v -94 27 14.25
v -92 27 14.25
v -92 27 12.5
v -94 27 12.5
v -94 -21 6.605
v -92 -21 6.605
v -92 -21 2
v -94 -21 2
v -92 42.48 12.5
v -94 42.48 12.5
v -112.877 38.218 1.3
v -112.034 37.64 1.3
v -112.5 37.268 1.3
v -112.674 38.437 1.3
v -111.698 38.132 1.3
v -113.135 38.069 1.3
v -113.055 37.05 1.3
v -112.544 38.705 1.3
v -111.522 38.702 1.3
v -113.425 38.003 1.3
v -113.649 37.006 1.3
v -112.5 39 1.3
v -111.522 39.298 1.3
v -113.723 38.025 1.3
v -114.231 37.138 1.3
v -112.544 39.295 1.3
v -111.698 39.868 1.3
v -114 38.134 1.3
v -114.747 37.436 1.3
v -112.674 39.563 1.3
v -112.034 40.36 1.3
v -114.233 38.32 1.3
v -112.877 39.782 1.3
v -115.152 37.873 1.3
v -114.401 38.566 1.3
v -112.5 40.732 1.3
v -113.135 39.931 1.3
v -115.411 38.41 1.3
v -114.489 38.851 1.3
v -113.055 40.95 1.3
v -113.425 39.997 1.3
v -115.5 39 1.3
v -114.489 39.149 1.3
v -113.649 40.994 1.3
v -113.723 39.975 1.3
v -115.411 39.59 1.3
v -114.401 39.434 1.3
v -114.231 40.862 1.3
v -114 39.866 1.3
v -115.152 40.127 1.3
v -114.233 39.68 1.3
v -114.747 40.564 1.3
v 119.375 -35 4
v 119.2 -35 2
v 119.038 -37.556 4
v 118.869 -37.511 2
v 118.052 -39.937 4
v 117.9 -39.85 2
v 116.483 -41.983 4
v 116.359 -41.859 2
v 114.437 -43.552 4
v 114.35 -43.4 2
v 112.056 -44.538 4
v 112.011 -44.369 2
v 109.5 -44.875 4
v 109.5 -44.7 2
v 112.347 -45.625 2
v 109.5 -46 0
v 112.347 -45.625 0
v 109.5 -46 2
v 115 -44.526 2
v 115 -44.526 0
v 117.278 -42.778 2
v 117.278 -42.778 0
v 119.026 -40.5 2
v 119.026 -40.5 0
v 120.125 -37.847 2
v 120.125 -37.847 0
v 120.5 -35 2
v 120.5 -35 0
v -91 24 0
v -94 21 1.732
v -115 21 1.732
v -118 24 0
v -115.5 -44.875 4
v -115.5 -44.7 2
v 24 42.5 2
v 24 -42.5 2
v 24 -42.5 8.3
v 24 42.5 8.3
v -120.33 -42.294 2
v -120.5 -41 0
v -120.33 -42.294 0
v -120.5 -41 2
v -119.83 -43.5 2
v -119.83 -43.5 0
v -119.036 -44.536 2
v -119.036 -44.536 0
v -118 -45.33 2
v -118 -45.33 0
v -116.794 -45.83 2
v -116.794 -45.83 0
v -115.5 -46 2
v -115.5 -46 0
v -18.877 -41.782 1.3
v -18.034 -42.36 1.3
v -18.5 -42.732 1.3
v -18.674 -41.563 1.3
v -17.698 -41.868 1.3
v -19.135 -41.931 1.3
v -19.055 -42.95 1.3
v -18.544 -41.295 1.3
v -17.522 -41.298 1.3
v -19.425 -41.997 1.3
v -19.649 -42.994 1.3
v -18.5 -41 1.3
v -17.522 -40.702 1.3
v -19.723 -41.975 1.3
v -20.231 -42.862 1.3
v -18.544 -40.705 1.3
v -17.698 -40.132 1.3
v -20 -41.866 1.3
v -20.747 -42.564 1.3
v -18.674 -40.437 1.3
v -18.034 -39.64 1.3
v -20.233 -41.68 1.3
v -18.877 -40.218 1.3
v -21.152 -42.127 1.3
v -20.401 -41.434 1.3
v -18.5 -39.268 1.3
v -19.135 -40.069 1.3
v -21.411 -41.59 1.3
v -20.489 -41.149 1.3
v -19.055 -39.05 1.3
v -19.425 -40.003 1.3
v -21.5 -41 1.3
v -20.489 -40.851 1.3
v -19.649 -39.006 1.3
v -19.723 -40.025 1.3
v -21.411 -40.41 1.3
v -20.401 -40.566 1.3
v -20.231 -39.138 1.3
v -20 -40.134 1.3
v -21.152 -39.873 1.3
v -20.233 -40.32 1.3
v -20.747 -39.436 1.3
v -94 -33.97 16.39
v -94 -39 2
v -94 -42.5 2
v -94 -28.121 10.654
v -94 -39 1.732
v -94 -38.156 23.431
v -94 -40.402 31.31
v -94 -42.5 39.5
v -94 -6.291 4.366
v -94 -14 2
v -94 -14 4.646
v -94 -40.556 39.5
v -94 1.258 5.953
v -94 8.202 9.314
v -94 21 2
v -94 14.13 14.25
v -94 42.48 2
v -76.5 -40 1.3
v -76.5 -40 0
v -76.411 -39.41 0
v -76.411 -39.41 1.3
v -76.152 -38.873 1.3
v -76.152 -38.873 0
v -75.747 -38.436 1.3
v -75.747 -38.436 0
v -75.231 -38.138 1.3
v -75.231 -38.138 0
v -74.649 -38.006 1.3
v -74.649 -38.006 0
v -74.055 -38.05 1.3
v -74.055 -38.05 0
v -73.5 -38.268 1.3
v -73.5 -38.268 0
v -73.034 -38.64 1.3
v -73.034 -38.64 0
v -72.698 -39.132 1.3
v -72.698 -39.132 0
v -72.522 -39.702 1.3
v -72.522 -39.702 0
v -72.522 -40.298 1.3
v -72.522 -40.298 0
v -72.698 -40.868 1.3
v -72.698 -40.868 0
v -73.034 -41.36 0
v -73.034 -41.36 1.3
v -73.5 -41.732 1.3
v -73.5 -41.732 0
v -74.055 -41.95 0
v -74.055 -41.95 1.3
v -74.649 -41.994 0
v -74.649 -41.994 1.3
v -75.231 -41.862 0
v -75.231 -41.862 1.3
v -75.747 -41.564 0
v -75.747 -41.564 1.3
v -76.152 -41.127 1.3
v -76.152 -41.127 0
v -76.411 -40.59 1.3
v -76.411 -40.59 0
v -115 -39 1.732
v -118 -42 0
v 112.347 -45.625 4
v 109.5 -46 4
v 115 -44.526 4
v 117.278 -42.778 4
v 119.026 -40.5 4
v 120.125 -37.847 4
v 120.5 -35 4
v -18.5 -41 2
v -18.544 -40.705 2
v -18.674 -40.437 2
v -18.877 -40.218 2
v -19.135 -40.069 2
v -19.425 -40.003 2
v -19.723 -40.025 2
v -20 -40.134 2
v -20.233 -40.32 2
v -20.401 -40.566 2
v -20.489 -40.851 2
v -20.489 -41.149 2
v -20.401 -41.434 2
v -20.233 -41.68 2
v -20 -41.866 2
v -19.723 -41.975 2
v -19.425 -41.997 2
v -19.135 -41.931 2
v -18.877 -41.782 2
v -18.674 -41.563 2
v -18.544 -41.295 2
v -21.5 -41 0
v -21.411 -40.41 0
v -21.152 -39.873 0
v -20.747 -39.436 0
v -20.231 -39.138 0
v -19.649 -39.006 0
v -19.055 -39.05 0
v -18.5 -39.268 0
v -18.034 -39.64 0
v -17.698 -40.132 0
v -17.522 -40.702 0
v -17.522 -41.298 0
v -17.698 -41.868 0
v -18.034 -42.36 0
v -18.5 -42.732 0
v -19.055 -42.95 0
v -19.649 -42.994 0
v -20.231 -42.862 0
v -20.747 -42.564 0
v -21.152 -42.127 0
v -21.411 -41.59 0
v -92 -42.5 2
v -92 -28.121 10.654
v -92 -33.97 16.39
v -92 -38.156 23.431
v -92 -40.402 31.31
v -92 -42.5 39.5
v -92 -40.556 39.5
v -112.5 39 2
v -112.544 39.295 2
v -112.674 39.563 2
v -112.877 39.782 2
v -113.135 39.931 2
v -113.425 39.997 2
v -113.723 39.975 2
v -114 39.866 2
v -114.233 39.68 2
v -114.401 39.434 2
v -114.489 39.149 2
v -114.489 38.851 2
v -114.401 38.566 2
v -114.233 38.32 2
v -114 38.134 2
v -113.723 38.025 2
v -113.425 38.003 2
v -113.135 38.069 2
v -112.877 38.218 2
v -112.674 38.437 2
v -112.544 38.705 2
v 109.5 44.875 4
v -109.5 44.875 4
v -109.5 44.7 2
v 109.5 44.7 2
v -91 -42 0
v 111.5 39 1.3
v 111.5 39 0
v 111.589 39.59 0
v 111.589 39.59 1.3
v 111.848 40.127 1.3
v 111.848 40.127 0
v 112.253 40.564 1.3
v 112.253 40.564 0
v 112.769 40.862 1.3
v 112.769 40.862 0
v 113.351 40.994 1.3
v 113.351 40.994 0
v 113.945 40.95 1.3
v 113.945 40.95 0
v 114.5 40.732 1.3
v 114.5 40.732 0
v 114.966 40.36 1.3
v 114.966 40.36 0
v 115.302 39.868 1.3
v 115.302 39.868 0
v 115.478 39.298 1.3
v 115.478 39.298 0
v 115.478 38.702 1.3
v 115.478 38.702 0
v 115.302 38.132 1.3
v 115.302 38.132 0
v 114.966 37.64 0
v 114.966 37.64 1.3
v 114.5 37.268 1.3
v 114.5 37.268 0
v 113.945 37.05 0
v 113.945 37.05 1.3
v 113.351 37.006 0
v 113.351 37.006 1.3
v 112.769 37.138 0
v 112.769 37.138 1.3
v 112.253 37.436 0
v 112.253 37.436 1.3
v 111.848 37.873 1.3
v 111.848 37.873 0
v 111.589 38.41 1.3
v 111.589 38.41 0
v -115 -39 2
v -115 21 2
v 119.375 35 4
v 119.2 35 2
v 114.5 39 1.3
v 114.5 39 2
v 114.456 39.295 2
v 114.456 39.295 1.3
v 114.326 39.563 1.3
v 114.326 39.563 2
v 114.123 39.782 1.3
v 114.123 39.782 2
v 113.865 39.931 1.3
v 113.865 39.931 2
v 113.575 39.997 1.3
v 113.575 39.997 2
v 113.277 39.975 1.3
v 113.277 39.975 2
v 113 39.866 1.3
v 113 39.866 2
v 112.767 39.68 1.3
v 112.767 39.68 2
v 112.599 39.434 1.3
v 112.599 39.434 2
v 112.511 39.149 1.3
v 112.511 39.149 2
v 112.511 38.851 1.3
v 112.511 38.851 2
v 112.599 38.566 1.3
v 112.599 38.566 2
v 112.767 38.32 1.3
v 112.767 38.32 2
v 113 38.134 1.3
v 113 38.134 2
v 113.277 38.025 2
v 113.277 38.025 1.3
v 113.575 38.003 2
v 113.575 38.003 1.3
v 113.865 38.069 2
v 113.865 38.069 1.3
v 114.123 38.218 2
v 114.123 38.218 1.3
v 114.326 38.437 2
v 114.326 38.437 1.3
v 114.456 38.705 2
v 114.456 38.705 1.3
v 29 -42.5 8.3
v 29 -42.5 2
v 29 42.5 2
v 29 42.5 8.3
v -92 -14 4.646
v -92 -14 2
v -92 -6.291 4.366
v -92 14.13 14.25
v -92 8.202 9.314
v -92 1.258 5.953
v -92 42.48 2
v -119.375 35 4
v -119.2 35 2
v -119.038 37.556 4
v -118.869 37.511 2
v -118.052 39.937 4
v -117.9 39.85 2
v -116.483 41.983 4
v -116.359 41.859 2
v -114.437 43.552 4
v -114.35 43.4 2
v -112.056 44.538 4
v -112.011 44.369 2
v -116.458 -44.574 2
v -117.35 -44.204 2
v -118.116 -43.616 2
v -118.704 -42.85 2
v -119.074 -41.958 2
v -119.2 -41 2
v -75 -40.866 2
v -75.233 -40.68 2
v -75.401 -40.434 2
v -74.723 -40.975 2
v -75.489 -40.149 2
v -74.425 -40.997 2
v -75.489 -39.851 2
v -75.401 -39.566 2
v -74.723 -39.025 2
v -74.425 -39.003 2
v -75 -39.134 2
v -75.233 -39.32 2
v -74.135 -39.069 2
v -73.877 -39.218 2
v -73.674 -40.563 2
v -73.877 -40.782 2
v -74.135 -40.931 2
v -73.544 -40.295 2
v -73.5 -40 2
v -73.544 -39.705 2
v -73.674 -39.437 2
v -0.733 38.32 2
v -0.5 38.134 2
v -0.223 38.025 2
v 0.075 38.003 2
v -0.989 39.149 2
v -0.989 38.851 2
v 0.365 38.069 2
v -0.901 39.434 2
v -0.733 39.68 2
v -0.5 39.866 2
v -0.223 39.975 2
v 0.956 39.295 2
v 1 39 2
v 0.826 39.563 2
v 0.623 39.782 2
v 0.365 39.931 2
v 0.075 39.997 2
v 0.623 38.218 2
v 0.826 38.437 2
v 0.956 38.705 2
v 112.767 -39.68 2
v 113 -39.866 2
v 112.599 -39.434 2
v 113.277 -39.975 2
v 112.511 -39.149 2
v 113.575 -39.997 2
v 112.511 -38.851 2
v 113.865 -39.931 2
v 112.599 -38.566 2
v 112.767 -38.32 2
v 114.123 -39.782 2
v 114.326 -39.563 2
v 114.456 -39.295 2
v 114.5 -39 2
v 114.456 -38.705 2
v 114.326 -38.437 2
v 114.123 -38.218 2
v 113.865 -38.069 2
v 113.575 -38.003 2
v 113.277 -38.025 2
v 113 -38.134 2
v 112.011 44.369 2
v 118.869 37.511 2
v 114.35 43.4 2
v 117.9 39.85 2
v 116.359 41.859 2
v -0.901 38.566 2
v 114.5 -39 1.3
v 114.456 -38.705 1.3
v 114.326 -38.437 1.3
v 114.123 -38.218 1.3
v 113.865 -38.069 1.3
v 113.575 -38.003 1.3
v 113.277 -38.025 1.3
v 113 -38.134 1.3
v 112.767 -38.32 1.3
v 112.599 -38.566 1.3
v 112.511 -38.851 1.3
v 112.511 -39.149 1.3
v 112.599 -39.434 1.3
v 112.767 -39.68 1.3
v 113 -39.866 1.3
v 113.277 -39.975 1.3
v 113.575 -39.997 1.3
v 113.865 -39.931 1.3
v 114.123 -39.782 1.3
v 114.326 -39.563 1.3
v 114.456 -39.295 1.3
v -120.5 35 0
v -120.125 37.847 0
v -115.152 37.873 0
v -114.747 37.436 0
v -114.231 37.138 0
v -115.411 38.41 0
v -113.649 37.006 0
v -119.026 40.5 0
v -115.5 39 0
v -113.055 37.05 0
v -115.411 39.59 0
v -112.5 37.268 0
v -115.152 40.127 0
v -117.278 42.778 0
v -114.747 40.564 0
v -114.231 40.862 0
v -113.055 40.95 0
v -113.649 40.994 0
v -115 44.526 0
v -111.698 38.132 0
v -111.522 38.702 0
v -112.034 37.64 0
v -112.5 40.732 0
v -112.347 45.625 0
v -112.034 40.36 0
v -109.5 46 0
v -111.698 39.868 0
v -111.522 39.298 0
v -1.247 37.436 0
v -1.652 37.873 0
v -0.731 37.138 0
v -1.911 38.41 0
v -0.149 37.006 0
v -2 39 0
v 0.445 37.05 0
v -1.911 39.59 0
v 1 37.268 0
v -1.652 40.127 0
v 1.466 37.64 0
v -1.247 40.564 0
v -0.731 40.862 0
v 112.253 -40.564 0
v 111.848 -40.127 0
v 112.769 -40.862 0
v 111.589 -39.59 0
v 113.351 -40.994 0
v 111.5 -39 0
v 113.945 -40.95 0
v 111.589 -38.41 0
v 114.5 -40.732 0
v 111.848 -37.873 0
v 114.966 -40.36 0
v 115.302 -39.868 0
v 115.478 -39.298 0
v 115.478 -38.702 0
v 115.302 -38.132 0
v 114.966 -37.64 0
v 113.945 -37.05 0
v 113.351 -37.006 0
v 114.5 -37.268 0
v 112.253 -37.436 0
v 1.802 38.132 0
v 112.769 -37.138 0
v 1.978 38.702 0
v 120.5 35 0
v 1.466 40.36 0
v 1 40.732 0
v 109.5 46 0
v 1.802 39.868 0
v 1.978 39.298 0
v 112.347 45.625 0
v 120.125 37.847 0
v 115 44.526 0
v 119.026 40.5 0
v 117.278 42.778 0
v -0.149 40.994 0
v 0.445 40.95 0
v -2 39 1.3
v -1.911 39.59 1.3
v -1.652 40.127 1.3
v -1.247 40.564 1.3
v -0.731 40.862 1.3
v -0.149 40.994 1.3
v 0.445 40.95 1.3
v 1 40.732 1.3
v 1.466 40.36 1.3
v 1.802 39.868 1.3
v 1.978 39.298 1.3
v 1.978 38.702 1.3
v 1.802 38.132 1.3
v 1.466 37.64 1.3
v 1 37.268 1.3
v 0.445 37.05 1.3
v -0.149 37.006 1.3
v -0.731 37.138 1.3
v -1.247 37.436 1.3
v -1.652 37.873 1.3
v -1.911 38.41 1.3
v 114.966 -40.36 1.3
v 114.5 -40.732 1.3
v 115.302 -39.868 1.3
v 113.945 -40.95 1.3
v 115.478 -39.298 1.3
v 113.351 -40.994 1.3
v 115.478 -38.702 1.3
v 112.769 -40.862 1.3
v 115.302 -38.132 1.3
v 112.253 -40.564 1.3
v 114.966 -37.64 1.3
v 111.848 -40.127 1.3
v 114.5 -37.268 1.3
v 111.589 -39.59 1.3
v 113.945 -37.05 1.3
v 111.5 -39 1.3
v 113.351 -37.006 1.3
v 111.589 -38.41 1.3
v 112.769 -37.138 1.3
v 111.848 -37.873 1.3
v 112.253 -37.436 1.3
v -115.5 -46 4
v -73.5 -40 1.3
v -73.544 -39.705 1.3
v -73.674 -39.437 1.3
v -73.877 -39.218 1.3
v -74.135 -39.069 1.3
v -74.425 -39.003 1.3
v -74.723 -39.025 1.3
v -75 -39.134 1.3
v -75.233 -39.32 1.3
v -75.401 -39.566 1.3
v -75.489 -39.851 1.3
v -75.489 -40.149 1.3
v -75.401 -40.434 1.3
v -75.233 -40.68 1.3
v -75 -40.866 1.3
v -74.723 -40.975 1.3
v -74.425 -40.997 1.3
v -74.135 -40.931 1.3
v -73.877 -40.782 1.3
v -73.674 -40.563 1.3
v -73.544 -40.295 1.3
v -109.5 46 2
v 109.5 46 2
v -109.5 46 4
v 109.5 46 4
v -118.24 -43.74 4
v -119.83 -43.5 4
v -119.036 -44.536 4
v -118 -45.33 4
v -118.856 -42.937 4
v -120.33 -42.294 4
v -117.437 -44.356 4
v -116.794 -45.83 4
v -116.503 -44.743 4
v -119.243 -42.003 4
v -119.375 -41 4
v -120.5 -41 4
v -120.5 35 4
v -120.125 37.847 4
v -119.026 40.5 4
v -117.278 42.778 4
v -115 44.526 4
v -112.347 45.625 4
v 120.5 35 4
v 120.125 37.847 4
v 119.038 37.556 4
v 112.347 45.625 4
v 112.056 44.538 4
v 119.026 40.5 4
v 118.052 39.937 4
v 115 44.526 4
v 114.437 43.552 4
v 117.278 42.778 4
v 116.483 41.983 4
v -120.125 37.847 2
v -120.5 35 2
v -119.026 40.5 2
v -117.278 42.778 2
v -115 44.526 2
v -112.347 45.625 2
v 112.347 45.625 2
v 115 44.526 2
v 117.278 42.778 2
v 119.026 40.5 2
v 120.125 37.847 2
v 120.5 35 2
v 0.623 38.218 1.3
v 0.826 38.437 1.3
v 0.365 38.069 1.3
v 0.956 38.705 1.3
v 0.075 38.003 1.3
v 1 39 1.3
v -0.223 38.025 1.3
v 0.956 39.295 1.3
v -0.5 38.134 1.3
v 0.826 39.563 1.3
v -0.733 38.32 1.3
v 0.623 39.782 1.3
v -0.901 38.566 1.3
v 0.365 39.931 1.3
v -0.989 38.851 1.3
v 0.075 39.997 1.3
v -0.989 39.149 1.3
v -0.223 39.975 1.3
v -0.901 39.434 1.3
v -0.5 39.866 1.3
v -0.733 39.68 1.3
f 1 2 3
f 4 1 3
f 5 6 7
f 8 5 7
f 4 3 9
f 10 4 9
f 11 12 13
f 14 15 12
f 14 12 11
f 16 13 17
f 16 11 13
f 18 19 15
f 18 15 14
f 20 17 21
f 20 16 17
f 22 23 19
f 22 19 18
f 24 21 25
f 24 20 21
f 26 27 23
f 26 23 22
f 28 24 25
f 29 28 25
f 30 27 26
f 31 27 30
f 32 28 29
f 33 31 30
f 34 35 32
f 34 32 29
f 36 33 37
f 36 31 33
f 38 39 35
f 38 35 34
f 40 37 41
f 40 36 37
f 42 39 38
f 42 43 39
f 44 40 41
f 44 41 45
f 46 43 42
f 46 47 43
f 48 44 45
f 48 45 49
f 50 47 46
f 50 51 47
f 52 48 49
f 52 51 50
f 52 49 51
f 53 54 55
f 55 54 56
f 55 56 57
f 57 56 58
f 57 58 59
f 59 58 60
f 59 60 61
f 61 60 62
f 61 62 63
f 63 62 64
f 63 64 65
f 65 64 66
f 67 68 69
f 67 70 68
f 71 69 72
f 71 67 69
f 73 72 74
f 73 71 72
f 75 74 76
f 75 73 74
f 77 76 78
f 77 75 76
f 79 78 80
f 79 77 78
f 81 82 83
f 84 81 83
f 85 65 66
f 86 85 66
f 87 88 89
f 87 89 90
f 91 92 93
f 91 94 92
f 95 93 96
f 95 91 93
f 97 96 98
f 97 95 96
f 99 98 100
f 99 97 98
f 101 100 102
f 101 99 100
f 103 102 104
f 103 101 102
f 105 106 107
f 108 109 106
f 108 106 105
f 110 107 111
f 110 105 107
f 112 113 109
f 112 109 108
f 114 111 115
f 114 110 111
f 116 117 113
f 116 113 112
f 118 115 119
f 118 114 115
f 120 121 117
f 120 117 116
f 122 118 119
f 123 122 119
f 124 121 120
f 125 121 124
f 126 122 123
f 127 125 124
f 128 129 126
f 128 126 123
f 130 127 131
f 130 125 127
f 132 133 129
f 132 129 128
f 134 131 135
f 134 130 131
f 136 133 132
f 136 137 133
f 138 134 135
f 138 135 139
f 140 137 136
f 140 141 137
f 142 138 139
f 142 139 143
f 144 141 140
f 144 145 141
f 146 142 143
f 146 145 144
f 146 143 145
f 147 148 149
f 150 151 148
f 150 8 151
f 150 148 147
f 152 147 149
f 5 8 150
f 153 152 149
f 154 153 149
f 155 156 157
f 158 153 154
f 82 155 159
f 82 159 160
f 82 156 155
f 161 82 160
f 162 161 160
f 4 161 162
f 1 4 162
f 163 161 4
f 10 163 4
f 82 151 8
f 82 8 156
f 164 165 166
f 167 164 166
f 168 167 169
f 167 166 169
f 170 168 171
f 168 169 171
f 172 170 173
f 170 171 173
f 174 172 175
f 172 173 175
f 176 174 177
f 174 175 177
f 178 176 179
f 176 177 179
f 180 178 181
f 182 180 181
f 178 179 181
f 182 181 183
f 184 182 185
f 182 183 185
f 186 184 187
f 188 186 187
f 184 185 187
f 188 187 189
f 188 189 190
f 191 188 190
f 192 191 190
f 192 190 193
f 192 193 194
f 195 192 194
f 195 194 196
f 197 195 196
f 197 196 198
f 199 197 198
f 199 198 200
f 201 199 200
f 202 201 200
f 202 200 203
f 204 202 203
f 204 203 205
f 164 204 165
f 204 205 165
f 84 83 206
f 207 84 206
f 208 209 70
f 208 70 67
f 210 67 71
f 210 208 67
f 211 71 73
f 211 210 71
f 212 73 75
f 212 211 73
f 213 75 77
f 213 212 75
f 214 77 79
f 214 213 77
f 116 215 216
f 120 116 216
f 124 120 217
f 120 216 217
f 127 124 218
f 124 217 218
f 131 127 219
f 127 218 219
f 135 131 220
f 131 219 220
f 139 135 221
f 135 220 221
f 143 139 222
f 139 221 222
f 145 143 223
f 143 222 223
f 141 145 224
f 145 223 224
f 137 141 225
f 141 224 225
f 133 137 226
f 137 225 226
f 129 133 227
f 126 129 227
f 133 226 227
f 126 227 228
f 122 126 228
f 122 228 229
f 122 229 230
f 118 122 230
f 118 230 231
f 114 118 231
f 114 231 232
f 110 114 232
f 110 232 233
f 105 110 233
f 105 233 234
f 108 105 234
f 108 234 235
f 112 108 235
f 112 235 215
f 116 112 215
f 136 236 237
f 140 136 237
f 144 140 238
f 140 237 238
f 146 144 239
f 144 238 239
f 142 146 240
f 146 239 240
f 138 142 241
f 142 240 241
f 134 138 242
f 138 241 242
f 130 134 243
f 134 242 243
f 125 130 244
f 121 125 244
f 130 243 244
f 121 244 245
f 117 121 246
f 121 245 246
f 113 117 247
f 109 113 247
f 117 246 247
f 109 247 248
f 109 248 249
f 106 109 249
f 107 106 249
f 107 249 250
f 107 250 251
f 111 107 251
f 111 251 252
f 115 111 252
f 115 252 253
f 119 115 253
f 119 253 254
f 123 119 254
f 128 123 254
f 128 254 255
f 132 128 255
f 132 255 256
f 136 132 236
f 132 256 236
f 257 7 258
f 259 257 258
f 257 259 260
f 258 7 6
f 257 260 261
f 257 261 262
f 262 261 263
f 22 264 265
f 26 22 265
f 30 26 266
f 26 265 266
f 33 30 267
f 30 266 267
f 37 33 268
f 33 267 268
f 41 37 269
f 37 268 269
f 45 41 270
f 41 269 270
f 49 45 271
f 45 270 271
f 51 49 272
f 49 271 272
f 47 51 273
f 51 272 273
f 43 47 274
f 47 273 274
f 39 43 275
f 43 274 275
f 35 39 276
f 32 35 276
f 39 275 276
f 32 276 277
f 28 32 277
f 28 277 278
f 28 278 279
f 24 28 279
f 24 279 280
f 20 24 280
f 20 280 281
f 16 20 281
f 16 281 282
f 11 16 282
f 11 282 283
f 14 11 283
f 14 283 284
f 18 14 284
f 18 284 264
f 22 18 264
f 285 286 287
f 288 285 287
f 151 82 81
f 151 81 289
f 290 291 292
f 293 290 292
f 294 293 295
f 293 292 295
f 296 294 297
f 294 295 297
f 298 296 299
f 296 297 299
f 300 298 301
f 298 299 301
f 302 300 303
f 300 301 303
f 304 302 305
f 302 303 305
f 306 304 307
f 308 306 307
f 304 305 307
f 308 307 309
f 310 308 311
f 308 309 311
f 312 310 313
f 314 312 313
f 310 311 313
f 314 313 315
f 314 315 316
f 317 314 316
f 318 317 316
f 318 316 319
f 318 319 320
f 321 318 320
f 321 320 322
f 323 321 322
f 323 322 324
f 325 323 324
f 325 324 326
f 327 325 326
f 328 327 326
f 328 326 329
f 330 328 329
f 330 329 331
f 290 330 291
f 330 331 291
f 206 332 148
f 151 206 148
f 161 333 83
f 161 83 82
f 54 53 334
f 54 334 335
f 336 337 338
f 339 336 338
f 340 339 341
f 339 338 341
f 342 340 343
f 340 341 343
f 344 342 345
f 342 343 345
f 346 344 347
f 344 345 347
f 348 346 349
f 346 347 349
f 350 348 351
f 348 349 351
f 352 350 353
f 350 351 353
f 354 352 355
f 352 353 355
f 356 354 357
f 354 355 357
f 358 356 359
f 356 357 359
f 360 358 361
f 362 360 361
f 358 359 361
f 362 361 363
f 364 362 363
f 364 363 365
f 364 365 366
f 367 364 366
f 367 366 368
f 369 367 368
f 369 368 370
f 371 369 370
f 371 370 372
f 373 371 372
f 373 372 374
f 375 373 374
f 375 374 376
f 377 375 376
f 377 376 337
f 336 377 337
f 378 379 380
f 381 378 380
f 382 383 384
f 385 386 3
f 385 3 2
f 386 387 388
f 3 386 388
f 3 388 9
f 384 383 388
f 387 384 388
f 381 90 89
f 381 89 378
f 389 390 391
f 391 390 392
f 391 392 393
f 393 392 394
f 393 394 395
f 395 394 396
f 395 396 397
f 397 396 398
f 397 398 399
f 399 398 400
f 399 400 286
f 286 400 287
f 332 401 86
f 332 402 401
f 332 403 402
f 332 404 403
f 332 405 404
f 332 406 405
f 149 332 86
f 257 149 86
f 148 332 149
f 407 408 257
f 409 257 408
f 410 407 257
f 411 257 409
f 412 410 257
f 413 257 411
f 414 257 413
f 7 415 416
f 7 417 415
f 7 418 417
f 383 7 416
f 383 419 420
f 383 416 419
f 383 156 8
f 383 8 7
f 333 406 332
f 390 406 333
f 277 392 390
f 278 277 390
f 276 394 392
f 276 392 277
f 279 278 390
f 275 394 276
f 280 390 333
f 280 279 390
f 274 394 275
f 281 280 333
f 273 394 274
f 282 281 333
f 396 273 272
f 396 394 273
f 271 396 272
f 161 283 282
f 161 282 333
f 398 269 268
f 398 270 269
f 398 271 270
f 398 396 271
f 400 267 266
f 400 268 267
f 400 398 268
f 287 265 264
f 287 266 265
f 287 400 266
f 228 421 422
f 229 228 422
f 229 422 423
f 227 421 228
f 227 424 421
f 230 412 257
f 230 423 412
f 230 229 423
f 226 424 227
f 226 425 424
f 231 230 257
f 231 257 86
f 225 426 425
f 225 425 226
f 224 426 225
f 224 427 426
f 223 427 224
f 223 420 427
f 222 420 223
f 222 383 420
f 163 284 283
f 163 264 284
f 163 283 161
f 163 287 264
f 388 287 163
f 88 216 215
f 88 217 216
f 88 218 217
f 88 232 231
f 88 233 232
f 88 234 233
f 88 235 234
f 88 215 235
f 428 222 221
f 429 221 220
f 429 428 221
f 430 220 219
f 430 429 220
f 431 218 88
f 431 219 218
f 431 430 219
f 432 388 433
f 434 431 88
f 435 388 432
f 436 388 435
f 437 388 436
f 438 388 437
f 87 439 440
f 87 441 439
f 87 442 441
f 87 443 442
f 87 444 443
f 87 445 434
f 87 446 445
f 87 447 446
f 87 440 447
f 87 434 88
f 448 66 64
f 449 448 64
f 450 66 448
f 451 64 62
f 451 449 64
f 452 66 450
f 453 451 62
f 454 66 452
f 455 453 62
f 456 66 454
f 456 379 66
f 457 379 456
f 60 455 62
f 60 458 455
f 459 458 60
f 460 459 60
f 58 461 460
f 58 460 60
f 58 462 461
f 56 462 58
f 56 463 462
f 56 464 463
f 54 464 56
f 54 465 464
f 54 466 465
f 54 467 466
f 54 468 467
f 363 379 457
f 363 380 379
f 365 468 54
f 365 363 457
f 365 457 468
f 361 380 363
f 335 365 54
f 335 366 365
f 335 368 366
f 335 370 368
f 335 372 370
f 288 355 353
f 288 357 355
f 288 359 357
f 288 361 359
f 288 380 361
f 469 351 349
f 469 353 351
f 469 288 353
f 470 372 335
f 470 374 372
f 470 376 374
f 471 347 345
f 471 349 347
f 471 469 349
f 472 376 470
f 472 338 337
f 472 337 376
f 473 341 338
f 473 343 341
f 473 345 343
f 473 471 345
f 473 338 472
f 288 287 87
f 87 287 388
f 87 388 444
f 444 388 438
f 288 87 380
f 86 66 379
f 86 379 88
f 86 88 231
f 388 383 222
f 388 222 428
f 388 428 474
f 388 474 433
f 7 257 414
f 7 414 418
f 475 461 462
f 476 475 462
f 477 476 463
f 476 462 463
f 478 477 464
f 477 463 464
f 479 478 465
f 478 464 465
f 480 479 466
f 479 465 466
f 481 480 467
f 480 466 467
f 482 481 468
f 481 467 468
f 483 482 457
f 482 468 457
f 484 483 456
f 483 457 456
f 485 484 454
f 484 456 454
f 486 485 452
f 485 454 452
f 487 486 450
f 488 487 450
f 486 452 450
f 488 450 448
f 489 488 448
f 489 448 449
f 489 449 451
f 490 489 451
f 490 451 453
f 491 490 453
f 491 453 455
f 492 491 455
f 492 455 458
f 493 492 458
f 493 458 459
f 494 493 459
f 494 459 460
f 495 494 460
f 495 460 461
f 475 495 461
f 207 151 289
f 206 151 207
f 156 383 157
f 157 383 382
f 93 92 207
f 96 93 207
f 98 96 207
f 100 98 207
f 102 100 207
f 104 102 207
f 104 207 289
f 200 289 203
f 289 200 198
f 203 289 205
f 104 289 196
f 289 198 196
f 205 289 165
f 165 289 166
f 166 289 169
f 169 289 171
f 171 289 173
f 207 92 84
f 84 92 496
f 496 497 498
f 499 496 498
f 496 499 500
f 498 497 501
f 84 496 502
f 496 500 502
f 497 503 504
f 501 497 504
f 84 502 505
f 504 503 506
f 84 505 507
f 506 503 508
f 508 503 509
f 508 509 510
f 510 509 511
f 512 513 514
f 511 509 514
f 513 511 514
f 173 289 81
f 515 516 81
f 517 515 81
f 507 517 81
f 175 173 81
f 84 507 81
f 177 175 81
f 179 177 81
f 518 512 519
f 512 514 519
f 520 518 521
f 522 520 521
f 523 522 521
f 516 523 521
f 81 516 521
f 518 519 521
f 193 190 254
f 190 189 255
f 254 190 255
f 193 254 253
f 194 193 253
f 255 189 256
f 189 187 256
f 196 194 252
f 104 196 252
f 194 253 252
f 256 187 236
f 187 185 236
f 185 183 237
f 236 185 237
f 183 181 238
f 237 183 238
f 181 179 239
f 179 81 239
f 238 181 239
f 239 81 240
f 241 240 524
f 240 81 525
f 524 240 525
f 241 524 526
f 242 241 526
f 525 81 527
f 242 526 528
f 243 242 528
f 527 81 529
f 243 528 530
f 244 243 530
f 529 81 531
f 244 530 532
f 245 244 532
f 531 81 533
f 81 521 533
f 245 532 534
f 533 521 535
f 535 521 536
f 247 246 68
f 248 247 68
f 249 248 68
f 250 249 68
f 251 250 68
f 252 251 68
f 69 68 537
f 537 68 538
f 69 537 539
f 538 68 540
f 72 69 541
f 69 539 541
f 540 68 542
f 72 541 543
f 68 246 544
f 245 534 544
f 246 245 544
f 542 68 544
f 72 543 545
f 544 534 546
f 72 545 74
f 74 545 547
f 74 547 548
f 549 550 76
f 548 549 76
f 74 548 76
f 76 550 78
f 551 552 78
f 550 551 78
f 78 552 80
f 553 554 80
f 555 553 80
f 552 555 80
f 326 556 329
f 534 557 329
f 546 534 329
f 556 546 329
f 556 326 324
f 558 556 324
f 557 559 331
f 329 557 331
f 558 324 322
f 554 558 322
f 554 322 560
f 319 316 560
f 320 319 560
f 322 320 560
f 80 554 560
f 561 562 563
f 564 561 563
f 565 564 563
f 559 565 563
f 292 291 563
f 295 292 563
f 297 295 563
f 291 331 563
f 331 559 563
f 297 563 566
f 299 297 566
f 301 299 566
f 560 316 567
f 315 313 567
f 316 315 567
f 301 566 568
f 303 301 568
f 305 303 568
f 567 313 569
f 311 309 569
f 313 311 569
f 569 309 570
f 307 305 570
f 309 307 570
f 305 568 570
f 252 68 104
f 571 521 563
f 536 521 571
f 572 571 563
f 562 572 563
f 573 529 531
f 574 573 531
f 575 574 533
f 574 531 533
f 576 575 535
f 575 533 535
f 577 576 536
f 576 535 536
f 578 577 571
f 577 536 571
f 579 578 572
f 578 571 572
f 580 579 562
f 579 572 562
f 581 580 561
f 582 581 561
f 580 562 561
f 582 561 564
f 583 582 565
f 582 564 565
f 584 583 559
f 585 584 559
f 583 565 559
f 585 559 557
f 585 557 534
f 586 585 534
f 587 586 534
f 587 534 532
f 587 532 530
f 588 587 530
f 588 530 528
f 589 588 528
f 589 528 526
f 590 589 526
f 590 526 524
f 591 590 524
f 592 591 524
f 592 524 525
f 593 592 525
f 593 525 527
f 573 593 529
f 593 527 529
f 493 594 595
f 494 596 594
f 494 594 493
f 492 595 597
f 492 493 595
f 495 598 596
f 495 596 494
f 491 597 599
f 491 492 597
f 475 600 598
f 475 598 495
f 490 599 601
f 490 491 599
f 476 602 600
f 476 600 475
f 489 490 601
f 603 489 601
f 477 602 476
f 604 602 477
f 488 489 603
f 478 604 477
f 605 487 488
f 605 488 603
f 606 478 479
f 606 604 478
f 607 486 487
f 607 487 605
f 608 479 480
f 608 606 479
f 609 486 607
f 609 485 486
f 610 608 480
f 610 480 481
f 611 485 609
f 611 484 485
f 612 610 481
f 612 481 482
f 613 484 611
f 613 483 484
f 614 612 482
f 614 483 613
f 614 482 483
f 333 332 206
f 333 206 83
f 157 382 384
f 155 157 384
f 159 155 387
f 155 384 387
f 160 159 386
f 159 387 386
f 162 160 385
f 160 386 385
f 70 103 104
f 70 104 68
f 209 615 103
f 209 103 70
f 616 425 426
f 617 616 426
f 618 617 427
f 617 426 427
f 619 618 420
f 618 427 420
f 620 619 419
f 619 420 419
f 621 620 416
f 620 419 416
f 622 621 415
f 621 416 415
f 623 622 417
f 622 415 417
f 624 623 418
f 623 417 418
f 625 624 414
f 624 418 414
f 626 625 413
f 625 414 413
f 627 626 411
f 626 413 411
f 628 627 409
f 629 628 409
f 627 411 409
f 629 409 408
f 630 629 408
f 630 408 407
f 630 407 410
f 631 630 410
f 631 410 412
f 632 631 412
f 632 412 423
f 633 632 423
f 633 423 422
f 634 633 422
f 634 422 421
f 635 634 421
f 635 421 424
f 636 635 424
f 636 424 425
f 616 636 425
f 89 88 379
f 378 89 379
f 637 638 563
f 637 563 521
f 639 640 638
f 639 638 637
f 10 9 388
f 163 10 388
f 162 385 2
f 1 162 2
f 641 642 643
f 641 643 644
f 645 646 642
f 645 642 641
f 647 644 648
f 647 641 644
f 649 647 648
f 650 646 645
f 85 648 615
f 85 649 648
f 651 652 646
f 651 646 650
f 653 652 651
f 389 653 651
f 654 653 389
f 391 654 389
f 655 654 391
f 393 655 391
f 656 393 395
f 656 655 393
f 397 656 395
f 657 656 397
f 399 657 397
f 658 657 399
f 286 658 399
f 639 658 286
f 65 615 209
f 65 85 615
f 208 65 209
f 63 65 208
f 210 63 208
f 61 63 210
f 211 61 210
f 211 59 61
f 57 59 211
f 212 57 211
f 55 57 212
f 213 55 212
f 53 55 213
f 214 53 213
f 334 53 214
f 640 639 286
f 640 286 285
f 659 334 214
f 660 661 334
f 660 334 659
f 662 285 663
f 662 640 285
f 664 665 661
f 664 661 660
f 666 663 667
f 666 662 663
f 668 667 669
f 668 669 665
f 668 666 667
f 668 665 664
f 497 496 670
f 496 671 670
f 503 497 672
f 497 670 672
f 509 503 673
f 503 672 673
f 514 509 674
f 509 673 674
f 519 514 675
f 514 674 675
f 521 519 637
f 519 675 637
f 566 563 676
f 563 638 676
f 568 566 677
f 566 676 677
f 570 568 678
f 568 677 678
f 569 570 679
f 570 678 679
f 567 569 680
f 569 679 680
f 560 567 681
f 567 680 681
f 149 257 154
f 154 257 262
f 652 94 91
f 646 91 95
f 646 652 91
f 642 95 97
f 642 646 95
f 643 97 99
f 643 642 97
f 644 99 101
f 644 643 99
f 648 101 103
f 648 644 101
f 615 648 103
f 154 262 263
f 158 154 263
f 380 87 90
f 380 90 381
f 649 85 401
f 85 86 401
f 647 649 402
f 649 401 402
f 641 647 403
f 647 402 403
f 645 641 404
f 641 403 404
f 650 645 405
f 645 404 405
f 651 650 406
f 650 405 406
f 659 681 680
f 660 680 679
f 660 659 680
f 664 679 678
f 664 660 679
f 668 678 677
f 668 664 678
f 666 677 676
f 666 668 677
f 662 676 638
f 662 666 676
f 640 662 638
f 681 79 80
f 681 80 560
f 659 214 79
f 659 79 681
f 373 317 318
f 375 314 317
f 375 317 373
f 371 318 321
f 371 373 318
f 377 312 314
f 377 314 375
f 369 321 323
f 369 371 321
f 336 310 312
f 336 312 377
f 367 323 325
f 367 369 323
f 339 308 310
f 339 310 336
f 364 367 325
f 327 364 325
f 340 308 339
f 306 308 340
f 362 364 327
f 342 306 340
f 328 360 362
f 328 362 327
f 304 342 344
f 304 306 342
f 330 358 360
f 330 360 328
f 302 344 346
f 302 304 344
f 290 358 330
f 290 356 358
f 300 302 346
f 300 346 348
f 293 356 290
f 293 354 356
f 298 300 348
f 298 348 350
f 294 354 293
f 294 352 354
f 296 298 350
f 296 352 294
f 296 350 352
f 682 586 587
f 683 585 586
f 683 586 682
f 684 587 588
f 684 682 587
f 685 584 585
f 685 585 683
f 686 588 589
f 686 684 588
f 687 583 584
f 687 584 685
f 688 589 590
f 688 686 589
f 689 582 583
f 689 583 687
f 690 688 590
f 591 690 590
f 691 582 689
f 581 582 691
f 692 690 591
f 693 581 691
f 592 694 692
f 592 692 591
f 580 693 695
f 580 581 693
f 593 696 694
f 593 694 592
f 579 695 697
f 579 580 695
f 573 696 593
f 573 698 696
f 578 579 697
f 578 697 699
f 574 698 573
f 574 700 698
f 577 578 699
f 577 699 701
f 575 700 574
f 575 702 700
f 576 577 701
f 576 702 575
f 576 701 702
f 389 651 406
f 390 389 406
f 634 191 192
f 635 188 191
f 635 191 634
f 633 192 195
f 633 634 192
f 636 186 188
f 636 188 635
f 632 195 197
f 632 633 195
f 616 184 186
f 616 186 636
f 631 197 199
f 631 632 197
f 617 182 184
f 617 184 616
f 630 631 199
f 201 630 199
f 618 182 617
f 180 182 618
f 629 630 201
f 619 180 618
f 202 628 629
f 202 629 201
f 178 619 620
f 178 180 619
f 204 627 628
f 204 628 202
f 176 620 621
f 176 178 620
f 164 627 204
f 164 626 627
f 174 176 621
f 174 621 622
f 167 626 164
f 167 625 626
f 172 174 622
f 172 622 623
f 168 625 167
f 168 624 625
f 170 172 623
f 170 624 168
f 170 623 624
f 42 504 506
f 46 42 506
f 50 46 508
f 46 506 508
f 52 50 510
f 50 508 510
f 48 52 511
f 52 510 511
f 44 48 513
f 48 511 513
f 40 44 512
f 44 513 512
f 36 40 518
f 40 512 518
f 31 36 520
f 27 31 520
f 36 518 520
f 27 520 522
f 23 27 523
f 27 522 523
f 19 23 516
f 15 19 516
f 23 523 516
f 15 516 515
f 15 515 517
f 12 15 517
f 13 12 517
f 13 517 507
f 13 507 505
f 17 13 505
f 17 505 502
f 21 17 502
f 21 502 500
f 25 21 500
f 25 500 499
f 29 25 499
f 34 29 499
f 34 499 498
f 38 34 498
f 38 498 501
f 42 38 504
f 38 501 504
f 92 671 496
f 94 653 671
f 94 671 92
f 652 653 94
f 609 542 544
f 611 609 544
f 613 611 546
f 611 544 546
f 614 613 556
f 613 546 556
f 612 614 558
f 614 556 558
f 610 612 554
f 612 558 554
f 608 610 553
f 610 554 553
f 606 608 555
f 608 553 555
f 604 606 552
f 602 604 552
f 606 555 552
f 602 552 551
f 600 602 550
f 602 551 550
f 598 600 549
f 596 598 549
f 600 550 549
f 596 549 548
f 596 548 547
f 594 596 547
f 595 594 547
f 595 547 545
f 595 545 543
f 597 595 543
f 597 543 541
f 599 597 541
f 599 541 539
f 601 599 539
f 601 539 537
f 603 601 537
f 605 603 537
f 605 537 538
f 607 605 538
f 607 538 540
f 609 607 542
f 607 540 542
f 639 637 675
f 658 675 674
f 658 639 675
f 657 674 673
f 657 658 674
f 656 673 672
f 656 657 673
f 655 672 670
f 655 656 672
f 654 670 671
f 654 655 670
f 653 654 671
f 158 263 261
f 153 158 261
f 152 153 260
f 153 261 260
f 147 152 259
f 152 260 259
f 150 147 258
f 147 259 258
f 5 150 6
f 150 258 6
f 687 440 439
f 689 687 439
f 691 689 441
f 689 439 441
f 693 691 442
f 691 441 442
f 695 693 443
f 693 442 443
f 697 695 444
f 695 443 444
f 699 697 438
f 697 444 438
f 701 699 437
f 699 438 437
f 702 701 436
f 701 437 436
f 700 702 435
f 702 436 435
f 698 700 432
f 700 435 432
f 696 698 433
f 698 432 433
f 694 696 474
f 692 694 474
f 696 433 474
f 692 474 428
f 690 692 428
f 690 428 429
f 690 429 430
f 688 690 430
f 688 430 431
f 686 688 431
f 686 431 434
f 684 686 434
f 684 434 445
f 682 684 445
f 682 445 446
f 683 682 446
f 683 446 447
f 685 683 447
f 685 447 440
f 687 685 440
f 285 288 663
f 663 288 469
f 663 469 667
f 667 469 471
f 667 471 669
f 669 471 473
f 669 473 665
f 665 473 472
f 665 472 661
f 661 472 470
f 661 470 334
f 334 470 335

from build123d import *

# Parameters (mm, degrees)
SKETCH_1_W          = 241
SKETCH_1_H          = 92
EXTRUDE_1_DEPTH     = 2
FILLET_1_R          = 5
FILLET_2_R          = 11
CUT_EXTRUDE_1_REACH = 130.997
SKETCH_3_R          = 1
SKETCH_4_R          = 2
CUT_EXTRUDE_2_DEPTH = 1.3
EXTRUDE_START       = 2
EXTRUDE_2_DEPTH     = 2
CHAMFER_1_SIZE      = 0.174977327
CHAMFER_1_SIZE_2    = 2
SKETCH_6_W          = 5
SKETCH_6_H          = 85
EXTRUDE_3_DEPTH     = 6.3
CUT_EXTRUDE_3_REACH = 131.135
SKETCH_7_W          = 21
SKETCH_7_H          = 60
EXTRUDE_START_2     = -28.5
EXTRUDE_4_DEPTH     = 2
CHAMFER_2_SIZE      = 3
CHAMFER_2_SIZE2     = 1.732050808


with BuildPart() as part:
    # 草图1 → 凸台-拉伸1 (new body)
    with BuildSketch(Plane.XY):
        Rectangle(SKETCH_1_W, SKETCH_1_H)
    extrude(amount=EXTRUDE_1_DEPTH)

    # 圆角1
    fillet_1_edges = [part.edges().sort_by_distance(p)[0] for p in [
        (-120.5, -46, 1),
    ]]
    fillet(fillet_1_edges, radius=FILLET_1_R)

    # 圆角2
    fillet_2_edges = [part.edges().sort_by_distance(p)[0] for p in [
        (120.5, -46, 1),
        (-120.5, 46, 1),
        (120.5, 46, 1),
    ]]
    fillet(fillet_2_edges, radius=FILLET_2_R)

    # 草图3 → 切除-拉伸1 (cut, up to next)
    with BuildSketch(Plane.XY.offset(2), mode=Mode.PRIVATE) as cut_extrude_1_sk1:
        with Locations((-19.5, -41)):
            Circle(SKETCH_3_R)
    cut_extrude_1_tool1 = extrude(cut_extrude_1_sk1.sketch, amount=-CUT_EXTRUDE_1_REACH, mode=Mode.PRIVATE) & part.part
    # 草图3 → 切除-拉伸1 (cut, up to next)
    with BuildSketch(Plane.XY.offset(2), mode=Mode.PRIVATE) as cut_extrude_1_sk2:
        with Locations((-74.5, -40)):
            Circle(SKETCH_3_R)
    cut_extrude_1_tool2 = extrude(cut_extrude_1_sk2.sketch, amount=-CUT_EXTRUDE_1_REACH, mode=Mode.PRIVATE) & part.part
    # 草图3 → 切除-拉伸1 (cut, up to next)
    with BuildSketch(Plane.XY.offset(2), mode=Mode.PRIVATE) as cut_extrude_1_sk3:
        with Locations((-113.5, 39)):
            Circle(SKETCH_3_R)
    cut_extrude_1_tool3 = extrude(cut_extrude_1_sk3.sketch, amount=-CUT_EXTRUDE_1_REACH, mode=Mode.PRIVATE) & part.part
    # 草图3 → 切除-拉伸1 (cut, up to next)
    with BuildSketch(Plane.XY.offset(2), mode=Mode.PRIVATE) as cut_extrude_1_sk4:
        with Locations((0, 39)):
            Circle(SKETCH_3_R)
    cut_extrude_1_tool4 = extrude(cut_extrude_1_sk4.sketch, amount=-CUT_EXTRUDE_1_REACH, mode=Mode.PRIVATE) & part.part
    # 草图3 → 切除-拉伸1 (cut, up to next)
    with BuildSketch(Plane.XY.offset(2), mode=Mode.PRIVATE) as cut_extrude_1_sk5:
        with Locations((113.5, -39)):
            Circle(SKETCH_3_R)
    cut_extrude_1_tool5 = extrude(cut_extrude_1_sk5.sketch, amount=-CUT_EXTRUDE_1_REACH, mode=Mode.PRIVATE) & part.part
    # 草图3 → 切除-拉伸1 (cut, up to next)
    with BuildSketch(Plane.XY.offset(2), mode=Mode.PRIVATE) as cut_extrude_1_sk6:
        with Locations((113.5, 39)):
            Circle(SKETCH_3_R)
    cut_extrude_1_tool6 = extrude(cut_extrude_1_sk6.sketch, amount=-CUT_EXTRUDE_1_REACH, mode=Mode.PRIVATE) & part.part
    add(cut_extrude_1_tool1.solids().sort_by_distance((-19.5, -41, 2))[0], mode=Mode.SUBTRACT)
    add(cut_extrude_1_tool2.solids().sort_by_distance((-74.5, -40, 2))[0], mode=Mode.SUBTRACT)
    add(cut_extrude_1_tool3.solids().sort_by_distance((-113.5, 39, 2))[0], mode=Mode.SUBTRACT)
    add(cut_extrude_1_tool4.solids().sort_by_distance((0, 39, 2))[0], mode=Mode.SUBTRACT)
    add(cut_extrude_1_tool5.solids().sort_by_distance((113.5, -39, 2))[0], mode=Mode.SUBTRACT)
    add(cut_extrude_1_tool6.solids().sort_by_distance((113.5, 39, 2))[0], mode=Mode.SUBTRACT)

    # 草图4 → 切除-拉伸2 (cut)
    with BuildSketch(Plane(origin=(0, 0, 0), x_dir=(-1, 0, 0), z_dir=(0, 0, -1))):
        with Locations((74.5, -40)):
            Circle(SKETCH_4_R)
        with Locations((19.5, -41)):
            Circle(SKETCH_4_R)
        with Locations((-113.5, -39)):
            Circle(SKETCH_4_R)
        with Locations((-113.5, 39)):
            Circle(SKETCH_4_R)
        with Locations((0, 39)):
            Circle(SKETCH_4_R)
        with Locations((113.5, 39)):
            Circle(SKETCH_4_R)
    extrude(amount=-CUT_EXTRUDE_2_DEPTH, mode=Mode.SUBTRACT)

    # 草图5 → 凸台-拉伸2 (add)
    with BuildSketch(Plane.XY.offset(2).offset(EXTRUDE_START)):
        with BuildLine():
            ThreePointArc((-120.5, -41), (-119.035533906, -44.535533906), (-115.5, -46))
            Line((-115.5, -46), (109.5, -46))
            ThreePointArc((109.5, -46), (117.278174593, -42.778174593), (120.5, -35))
            Line((120.5, -35), (120.5, 35))
            ThreePointArc((120.5, 35), (117.278174593, 42.778174593), (109.5, 46))
            Line((109.5, 46), (-109.5, 46))
            ThreePointArc((-109.5, 46), (-117.278174593, 42.778174593), (-120.5, 35))
            Line((-120.5, 35), (-120.5, -41))
        make_face()
        with BuildLine():
            Line((109.5, -44.7), (-115.5, -44.7))
            ThreePointArc((-115.5, -44.7), (-118.11629509, -43.61629509), (-119.2, -41))
            Line((-119.2, -41), (-119.2, 35))
            ThreePointArc((-119.2, 35), (-116.358935778, 41.858935778), (-109.5, 44.7))
            Line((-109.5, 44.7), (109.5, 44.7))
            ThreePointArc((109.5, 44.7), (116.358935778, 41.858935778), (119.2, 35))
            Line((119.2, 35), (119.2, -35))
            ThreePointArc((119.2, -35), (116.358935778, -41.858935778), (109.5, -44.7))
        make_face(mode=Mode.SUBTRACT)
    extrude(amount=-EXTRUDE_2_DEPTH)

    # 倒角1
    # the kernel refuses this chamfer: 2, 0.174977327 mm, written as the material it takes off along each edge
    with BuildSketch(Plane(origin=(-109.5, 44.7, 4), x_dir=(0, 0.9159861691531133, 0.40120984275090293), z_dir=(1, 0, 0))) as chamfer_1_piece_1_section:
        Polygon((CHAMFER_1_SIZE * 0.915986169425, -CHAMFER_1_SIZE * 0.40120984287), (-CHAMFER_1_SIZE_2 * 0.401209842751, -CHAMFER_1_SIZE_2 * 0.915986169153), (0, 0), align=None)
    chamfer_1_piece_1 = extrude(amount=219, mode=Mode.PRIVATE)
    chamfer_1_piece_1 = split(chamfer_1_piece_1, bisect_by=Plane(origin=(0, 44.735649873, 2), z_dir=(0, 0, 1)), keep=Keep.TOP, mode=Mode.PRIVATE)
    add(chamfer_1_piece_1, mode=Mode.SUBTRACT)
    with BuildSketch(Plane(origin=(109.5, 35, 4), x_dir=(0, 1, 0), z_dir=(-1, 0, 0))) as chamfer_1_piece_2_section:
        Polygon((9.7 + CHAMFER_1_SIZE, 0), (9.7, CHAMFER_1_SIZE_2), (9.7, 0), align=None)
    chamfer_1_piece_2 = revolve(axis=Axis((109.5, 35, 4), (0, 0, -1)), revolution_arc=90, mode=Mode.PRIVATE)
    chamfer_1_piece_2 = split(chamfer_1_piece_2, bisect_by=Plane(origin=(116.41200817, 41.91200817, 2), z_dir=(0, 0, 1)), keep=Keep.TOP, mode=Mode.PRIVATE)
    add(chamfer_1_piece_2, mode=Mode.SUBTRACT)
    with BuildSketch(Plane(origin=(-109.5, 35, 4), x_dir=(-1, 0, 0), z_dir=(0, -1, 0))) as chamfer_1_piece_3_section:
        Polygon((9.7 + CHAMFER_1_SIZE, 0), (9.7, CHAMFER_1_SIZE_2), (9.7, 0), align=None)
    chamfer_1_piece_3 = revolve(axis=Axis((-109.5, 35, 4), (0, 0, -1)), revolution_arc=90, mode=Mode.PRIVATE)
    chamfer_1_piece_3 = split(chamfer_1_piece_3, bisect_by=Plane(origin=(-116.412008168, 41.912008168, 2), z_dir=(0, 0, 1)), keep=Keep.TOP, mode=Mode.PRIVATE)
    add(chamfer_1_piece_3, mode=Mode.SUBTRACT)
    with BuildSketch(Plane(origin=(119.2, 35, 4), x_dir=(0.9159861691531133, 0, 0.40120984275090293), z_dir=(0, -1, 0))) as chamfer_1_piece_4_section:
        Polygon((CHAMFER_1_SIZE * 0.915986169425, -CHAMFER_1_SIZE * 0.40120984287), (-CHAMFER_1_SIZE_2 * 0.401209842751, -CHAMFER_1_SIZE_2 * 0.915986169153), (0, 0), align=None)
    chamfer_1_piece_4 = extrude(amount=70, mode=Mode.PRIVATE)
    chamfer_1_piece_4 = split(chamfer_1_piece_4, bisect_by=Plane(origin=(119.235649873, 0, 2), z_dir=(0, 0, 1)), keep=Keep.TOP, mode=Mode.PRIVATE)
    add(chamfer_1_piece_4, mode=Mode.SUBTRACT)
    with BuildSketch(Plane(origin=(-119.2, -41, 4), x_dir=(-0.9159861691531133, 0, 0.40120984275090293), z_dir=(0, 1, 0))) as chamfer_1_piece_5_section:
        Polygon((CHAMFER_1_SIZE * 0.915986169425, -CHAMFER_1_SIZE * 0.40120984287), (-CHAMFER_1_SIZE_2 * 0.401209842751, -CHAMFER_1_SIZE_2 * 0.915986169153), (0, 0), align=None)
    chamfer_1_piece_5 = extrude(amount=76, mode=Mode.PRIVATE)
    chamfer_1_piece_5 = split(chamfer_1_piece_5, bisect_by=Plane(origin=(-119.235649873, -3, 2), z_dir=(0, 0, 1)), keep=Keep.TOP, mode=Mode.PRIVATE)
    add(chamfer_1_piece_5, mode=Mode.SUBTRACT)
    with BuildSketch(Plane(origin=(109.5, -35, 4), x_dir=(1, 0, 0), z_dir=(0, 1, 0))) as chamfer_1_piece_6_section:
        Polygon((9.7 + CHAMFER_1_SIZE, 0), (9.7, CHAMFER_1_SIZE_2), (9.7, 0), align=None)
    chamfer_1_piece_6 = revolve(axis=Axis((109.5, -35, 4), (0, 0, -1)), revolution_arc=90, mode=Mode.PRIVATE)
    chamfer_1_piece_6 = split(chamfer_1_piece_6, bisect_by=Plane(origin=(116.41200817, -41.91200817, 2), z_dir=(0, 0, 1)), keep=Keep.TOP, mode=Mode.PRIVATE)
    add(chamfer_1_piece_6, mode=Mode.SUBTRACT)
    with BuildSketch(Plane(origin=(-115.5, -41, 4), x_dir=(0, -1, 0), z_dir=(1, 0, 0))) as chamfer_1_piece_7_section:
        Polygon((3.7 + CHAMFER_1_SIZE, 0), (3.7, CHAMFER_1_SIZE_2), (3.7, 0), align=None)
    chamfer_1_piece_7 = revolve(axis=Axis((-115.5, -41, 4), (0, 0, -1)), revolution_arc=90, mode=Mode.PRIVATE)
    chamfer_1_piece_7 = split(chamfer_1_piece_7, bisect_by=Plane(origin=(-118.172444307, -43.672444307, 2), z_dir=(0, 0, 1)), keep=Keep.TOP, mode=Mode.PRIVATE)
    add(chamfer_1_piece_7, mode=Mode.SUBTRACT)
    with BuildSketch(Plane(origin=(109.5, -44.7, 4), x_dir=(0, -0.9159861691531133, 0.40120984275090293), z_dir=(-1, 0, 0))) as chamfer_1_piece_8_section:
        Polygon((CHAMFER_1_SIZE * 0.915986169425, -CHAMFER_1_SIZE * 0.40120984287), (-CHAMFER_1_SIZE_2 * 0.401209842751, -CHAMFER_1_SIZE_2 * 0.915986169153), (0, 0), align=None)
    chamfer_1_piece_8 = extrude(amount=225, mode=Mode.PRIVATE)
    chamfer_1_piece_8 = split(chamfer_1_piece_8, bisect_by=Plane(origin=(-3, -44.735649873, 2), z_dir=(0, 0, 1)), keep=Keep.TOP, mode=Mode.PRIVATE)
    add(chamfer_1_piece_8, mode=Mode.SUBTRACT)

    # 草图6 → 凸台-拉伸3 (add)
    with BuildSketch(Plane.XY.offset(2)):
        with Locations((26.5, 0)):
            Rectangle(SKETCH_6_W, SKETCH_6_H)
    extrude(amount=EXTRUDE_3_DEPTH)

    # 草图7 → 切除-拉伸3 (cut, up to next)
    with BuildSketch(Plane.XY.offset(2), mode=Mode.PRIVATE) as cut_extrude_3_sk1:
        with Locations((-104.5, -9)):
            Rectangle(SKETCH_7_W, SKETCH_7_H)
    cut_extrude_3_tool1 = extrude(cut_extrude_3_sk1.sketch, amount=-CUT_EXTRUDE_3_REACH, mode=Mode.PRIVATE) & part.part
    add(cut_extrude_3_tool1.solids().sort_by_distance((-104.5, -9, 2))[0], mode=Mode.SUBTRACT)

    # 草图8 → 凸台-拉伸4 (add)
    with BuildSketch(Plane.ZY.offset(120.5).offset(EXTRUDE_START_2)):
        with BuildLine():
            Line((2, -21), (2, -42.5))
            Line((2, -42.5), (39.5, -42.5))
            Line((39.5, -42.5), (39.5, -40.556496954))
            ThreePointArc((39.5, -40.556496954), (19.774984647, -36.291232599), (6.605059959, -21))
            Line((6.605059959, -21), (2, -21))
        make_face()
        with BuildLine():
            Line((2, -14), (4.646172482, -14))
            ThreePointArc((4.646172482, -14), (5.952882138, 1.25832385), (14.25, 14.130067012))
            Line((14.25, 14.130067012), (14.25, 27))
            Line((14.25, 27), (12.5, 27))
            Line((12.5, 27), (12.5, 42.479565739))
            Line((12.5, 42.479565739), (2, 42.479565739))
            Line((2, 42.479565739), (2, -14))
        make_face()
    extrude(amount=EXTRUDE_4_DEPTH)

    # 倒角2
    chamfer_2_edges = [part.edges().sort_by_distance(p)[0] for p in [
        (-104.5, -39, 0),
        (-115, -9, 0),
        (-104.5, 21, 0),
        (-94, -9, 0),
    ]]
    chamfer_2_side = [part.faces().sort_by_distance(p)[0] for p in [
        (6.21588018, 0.505356203, 0),
    ]]
    chamfer(chamfer_2_edges, length=CHAMFER_2_SIZE, length2=CHAMFER_2_SIZE2, reference=chamfer_2_side[0])


solid = part.part
